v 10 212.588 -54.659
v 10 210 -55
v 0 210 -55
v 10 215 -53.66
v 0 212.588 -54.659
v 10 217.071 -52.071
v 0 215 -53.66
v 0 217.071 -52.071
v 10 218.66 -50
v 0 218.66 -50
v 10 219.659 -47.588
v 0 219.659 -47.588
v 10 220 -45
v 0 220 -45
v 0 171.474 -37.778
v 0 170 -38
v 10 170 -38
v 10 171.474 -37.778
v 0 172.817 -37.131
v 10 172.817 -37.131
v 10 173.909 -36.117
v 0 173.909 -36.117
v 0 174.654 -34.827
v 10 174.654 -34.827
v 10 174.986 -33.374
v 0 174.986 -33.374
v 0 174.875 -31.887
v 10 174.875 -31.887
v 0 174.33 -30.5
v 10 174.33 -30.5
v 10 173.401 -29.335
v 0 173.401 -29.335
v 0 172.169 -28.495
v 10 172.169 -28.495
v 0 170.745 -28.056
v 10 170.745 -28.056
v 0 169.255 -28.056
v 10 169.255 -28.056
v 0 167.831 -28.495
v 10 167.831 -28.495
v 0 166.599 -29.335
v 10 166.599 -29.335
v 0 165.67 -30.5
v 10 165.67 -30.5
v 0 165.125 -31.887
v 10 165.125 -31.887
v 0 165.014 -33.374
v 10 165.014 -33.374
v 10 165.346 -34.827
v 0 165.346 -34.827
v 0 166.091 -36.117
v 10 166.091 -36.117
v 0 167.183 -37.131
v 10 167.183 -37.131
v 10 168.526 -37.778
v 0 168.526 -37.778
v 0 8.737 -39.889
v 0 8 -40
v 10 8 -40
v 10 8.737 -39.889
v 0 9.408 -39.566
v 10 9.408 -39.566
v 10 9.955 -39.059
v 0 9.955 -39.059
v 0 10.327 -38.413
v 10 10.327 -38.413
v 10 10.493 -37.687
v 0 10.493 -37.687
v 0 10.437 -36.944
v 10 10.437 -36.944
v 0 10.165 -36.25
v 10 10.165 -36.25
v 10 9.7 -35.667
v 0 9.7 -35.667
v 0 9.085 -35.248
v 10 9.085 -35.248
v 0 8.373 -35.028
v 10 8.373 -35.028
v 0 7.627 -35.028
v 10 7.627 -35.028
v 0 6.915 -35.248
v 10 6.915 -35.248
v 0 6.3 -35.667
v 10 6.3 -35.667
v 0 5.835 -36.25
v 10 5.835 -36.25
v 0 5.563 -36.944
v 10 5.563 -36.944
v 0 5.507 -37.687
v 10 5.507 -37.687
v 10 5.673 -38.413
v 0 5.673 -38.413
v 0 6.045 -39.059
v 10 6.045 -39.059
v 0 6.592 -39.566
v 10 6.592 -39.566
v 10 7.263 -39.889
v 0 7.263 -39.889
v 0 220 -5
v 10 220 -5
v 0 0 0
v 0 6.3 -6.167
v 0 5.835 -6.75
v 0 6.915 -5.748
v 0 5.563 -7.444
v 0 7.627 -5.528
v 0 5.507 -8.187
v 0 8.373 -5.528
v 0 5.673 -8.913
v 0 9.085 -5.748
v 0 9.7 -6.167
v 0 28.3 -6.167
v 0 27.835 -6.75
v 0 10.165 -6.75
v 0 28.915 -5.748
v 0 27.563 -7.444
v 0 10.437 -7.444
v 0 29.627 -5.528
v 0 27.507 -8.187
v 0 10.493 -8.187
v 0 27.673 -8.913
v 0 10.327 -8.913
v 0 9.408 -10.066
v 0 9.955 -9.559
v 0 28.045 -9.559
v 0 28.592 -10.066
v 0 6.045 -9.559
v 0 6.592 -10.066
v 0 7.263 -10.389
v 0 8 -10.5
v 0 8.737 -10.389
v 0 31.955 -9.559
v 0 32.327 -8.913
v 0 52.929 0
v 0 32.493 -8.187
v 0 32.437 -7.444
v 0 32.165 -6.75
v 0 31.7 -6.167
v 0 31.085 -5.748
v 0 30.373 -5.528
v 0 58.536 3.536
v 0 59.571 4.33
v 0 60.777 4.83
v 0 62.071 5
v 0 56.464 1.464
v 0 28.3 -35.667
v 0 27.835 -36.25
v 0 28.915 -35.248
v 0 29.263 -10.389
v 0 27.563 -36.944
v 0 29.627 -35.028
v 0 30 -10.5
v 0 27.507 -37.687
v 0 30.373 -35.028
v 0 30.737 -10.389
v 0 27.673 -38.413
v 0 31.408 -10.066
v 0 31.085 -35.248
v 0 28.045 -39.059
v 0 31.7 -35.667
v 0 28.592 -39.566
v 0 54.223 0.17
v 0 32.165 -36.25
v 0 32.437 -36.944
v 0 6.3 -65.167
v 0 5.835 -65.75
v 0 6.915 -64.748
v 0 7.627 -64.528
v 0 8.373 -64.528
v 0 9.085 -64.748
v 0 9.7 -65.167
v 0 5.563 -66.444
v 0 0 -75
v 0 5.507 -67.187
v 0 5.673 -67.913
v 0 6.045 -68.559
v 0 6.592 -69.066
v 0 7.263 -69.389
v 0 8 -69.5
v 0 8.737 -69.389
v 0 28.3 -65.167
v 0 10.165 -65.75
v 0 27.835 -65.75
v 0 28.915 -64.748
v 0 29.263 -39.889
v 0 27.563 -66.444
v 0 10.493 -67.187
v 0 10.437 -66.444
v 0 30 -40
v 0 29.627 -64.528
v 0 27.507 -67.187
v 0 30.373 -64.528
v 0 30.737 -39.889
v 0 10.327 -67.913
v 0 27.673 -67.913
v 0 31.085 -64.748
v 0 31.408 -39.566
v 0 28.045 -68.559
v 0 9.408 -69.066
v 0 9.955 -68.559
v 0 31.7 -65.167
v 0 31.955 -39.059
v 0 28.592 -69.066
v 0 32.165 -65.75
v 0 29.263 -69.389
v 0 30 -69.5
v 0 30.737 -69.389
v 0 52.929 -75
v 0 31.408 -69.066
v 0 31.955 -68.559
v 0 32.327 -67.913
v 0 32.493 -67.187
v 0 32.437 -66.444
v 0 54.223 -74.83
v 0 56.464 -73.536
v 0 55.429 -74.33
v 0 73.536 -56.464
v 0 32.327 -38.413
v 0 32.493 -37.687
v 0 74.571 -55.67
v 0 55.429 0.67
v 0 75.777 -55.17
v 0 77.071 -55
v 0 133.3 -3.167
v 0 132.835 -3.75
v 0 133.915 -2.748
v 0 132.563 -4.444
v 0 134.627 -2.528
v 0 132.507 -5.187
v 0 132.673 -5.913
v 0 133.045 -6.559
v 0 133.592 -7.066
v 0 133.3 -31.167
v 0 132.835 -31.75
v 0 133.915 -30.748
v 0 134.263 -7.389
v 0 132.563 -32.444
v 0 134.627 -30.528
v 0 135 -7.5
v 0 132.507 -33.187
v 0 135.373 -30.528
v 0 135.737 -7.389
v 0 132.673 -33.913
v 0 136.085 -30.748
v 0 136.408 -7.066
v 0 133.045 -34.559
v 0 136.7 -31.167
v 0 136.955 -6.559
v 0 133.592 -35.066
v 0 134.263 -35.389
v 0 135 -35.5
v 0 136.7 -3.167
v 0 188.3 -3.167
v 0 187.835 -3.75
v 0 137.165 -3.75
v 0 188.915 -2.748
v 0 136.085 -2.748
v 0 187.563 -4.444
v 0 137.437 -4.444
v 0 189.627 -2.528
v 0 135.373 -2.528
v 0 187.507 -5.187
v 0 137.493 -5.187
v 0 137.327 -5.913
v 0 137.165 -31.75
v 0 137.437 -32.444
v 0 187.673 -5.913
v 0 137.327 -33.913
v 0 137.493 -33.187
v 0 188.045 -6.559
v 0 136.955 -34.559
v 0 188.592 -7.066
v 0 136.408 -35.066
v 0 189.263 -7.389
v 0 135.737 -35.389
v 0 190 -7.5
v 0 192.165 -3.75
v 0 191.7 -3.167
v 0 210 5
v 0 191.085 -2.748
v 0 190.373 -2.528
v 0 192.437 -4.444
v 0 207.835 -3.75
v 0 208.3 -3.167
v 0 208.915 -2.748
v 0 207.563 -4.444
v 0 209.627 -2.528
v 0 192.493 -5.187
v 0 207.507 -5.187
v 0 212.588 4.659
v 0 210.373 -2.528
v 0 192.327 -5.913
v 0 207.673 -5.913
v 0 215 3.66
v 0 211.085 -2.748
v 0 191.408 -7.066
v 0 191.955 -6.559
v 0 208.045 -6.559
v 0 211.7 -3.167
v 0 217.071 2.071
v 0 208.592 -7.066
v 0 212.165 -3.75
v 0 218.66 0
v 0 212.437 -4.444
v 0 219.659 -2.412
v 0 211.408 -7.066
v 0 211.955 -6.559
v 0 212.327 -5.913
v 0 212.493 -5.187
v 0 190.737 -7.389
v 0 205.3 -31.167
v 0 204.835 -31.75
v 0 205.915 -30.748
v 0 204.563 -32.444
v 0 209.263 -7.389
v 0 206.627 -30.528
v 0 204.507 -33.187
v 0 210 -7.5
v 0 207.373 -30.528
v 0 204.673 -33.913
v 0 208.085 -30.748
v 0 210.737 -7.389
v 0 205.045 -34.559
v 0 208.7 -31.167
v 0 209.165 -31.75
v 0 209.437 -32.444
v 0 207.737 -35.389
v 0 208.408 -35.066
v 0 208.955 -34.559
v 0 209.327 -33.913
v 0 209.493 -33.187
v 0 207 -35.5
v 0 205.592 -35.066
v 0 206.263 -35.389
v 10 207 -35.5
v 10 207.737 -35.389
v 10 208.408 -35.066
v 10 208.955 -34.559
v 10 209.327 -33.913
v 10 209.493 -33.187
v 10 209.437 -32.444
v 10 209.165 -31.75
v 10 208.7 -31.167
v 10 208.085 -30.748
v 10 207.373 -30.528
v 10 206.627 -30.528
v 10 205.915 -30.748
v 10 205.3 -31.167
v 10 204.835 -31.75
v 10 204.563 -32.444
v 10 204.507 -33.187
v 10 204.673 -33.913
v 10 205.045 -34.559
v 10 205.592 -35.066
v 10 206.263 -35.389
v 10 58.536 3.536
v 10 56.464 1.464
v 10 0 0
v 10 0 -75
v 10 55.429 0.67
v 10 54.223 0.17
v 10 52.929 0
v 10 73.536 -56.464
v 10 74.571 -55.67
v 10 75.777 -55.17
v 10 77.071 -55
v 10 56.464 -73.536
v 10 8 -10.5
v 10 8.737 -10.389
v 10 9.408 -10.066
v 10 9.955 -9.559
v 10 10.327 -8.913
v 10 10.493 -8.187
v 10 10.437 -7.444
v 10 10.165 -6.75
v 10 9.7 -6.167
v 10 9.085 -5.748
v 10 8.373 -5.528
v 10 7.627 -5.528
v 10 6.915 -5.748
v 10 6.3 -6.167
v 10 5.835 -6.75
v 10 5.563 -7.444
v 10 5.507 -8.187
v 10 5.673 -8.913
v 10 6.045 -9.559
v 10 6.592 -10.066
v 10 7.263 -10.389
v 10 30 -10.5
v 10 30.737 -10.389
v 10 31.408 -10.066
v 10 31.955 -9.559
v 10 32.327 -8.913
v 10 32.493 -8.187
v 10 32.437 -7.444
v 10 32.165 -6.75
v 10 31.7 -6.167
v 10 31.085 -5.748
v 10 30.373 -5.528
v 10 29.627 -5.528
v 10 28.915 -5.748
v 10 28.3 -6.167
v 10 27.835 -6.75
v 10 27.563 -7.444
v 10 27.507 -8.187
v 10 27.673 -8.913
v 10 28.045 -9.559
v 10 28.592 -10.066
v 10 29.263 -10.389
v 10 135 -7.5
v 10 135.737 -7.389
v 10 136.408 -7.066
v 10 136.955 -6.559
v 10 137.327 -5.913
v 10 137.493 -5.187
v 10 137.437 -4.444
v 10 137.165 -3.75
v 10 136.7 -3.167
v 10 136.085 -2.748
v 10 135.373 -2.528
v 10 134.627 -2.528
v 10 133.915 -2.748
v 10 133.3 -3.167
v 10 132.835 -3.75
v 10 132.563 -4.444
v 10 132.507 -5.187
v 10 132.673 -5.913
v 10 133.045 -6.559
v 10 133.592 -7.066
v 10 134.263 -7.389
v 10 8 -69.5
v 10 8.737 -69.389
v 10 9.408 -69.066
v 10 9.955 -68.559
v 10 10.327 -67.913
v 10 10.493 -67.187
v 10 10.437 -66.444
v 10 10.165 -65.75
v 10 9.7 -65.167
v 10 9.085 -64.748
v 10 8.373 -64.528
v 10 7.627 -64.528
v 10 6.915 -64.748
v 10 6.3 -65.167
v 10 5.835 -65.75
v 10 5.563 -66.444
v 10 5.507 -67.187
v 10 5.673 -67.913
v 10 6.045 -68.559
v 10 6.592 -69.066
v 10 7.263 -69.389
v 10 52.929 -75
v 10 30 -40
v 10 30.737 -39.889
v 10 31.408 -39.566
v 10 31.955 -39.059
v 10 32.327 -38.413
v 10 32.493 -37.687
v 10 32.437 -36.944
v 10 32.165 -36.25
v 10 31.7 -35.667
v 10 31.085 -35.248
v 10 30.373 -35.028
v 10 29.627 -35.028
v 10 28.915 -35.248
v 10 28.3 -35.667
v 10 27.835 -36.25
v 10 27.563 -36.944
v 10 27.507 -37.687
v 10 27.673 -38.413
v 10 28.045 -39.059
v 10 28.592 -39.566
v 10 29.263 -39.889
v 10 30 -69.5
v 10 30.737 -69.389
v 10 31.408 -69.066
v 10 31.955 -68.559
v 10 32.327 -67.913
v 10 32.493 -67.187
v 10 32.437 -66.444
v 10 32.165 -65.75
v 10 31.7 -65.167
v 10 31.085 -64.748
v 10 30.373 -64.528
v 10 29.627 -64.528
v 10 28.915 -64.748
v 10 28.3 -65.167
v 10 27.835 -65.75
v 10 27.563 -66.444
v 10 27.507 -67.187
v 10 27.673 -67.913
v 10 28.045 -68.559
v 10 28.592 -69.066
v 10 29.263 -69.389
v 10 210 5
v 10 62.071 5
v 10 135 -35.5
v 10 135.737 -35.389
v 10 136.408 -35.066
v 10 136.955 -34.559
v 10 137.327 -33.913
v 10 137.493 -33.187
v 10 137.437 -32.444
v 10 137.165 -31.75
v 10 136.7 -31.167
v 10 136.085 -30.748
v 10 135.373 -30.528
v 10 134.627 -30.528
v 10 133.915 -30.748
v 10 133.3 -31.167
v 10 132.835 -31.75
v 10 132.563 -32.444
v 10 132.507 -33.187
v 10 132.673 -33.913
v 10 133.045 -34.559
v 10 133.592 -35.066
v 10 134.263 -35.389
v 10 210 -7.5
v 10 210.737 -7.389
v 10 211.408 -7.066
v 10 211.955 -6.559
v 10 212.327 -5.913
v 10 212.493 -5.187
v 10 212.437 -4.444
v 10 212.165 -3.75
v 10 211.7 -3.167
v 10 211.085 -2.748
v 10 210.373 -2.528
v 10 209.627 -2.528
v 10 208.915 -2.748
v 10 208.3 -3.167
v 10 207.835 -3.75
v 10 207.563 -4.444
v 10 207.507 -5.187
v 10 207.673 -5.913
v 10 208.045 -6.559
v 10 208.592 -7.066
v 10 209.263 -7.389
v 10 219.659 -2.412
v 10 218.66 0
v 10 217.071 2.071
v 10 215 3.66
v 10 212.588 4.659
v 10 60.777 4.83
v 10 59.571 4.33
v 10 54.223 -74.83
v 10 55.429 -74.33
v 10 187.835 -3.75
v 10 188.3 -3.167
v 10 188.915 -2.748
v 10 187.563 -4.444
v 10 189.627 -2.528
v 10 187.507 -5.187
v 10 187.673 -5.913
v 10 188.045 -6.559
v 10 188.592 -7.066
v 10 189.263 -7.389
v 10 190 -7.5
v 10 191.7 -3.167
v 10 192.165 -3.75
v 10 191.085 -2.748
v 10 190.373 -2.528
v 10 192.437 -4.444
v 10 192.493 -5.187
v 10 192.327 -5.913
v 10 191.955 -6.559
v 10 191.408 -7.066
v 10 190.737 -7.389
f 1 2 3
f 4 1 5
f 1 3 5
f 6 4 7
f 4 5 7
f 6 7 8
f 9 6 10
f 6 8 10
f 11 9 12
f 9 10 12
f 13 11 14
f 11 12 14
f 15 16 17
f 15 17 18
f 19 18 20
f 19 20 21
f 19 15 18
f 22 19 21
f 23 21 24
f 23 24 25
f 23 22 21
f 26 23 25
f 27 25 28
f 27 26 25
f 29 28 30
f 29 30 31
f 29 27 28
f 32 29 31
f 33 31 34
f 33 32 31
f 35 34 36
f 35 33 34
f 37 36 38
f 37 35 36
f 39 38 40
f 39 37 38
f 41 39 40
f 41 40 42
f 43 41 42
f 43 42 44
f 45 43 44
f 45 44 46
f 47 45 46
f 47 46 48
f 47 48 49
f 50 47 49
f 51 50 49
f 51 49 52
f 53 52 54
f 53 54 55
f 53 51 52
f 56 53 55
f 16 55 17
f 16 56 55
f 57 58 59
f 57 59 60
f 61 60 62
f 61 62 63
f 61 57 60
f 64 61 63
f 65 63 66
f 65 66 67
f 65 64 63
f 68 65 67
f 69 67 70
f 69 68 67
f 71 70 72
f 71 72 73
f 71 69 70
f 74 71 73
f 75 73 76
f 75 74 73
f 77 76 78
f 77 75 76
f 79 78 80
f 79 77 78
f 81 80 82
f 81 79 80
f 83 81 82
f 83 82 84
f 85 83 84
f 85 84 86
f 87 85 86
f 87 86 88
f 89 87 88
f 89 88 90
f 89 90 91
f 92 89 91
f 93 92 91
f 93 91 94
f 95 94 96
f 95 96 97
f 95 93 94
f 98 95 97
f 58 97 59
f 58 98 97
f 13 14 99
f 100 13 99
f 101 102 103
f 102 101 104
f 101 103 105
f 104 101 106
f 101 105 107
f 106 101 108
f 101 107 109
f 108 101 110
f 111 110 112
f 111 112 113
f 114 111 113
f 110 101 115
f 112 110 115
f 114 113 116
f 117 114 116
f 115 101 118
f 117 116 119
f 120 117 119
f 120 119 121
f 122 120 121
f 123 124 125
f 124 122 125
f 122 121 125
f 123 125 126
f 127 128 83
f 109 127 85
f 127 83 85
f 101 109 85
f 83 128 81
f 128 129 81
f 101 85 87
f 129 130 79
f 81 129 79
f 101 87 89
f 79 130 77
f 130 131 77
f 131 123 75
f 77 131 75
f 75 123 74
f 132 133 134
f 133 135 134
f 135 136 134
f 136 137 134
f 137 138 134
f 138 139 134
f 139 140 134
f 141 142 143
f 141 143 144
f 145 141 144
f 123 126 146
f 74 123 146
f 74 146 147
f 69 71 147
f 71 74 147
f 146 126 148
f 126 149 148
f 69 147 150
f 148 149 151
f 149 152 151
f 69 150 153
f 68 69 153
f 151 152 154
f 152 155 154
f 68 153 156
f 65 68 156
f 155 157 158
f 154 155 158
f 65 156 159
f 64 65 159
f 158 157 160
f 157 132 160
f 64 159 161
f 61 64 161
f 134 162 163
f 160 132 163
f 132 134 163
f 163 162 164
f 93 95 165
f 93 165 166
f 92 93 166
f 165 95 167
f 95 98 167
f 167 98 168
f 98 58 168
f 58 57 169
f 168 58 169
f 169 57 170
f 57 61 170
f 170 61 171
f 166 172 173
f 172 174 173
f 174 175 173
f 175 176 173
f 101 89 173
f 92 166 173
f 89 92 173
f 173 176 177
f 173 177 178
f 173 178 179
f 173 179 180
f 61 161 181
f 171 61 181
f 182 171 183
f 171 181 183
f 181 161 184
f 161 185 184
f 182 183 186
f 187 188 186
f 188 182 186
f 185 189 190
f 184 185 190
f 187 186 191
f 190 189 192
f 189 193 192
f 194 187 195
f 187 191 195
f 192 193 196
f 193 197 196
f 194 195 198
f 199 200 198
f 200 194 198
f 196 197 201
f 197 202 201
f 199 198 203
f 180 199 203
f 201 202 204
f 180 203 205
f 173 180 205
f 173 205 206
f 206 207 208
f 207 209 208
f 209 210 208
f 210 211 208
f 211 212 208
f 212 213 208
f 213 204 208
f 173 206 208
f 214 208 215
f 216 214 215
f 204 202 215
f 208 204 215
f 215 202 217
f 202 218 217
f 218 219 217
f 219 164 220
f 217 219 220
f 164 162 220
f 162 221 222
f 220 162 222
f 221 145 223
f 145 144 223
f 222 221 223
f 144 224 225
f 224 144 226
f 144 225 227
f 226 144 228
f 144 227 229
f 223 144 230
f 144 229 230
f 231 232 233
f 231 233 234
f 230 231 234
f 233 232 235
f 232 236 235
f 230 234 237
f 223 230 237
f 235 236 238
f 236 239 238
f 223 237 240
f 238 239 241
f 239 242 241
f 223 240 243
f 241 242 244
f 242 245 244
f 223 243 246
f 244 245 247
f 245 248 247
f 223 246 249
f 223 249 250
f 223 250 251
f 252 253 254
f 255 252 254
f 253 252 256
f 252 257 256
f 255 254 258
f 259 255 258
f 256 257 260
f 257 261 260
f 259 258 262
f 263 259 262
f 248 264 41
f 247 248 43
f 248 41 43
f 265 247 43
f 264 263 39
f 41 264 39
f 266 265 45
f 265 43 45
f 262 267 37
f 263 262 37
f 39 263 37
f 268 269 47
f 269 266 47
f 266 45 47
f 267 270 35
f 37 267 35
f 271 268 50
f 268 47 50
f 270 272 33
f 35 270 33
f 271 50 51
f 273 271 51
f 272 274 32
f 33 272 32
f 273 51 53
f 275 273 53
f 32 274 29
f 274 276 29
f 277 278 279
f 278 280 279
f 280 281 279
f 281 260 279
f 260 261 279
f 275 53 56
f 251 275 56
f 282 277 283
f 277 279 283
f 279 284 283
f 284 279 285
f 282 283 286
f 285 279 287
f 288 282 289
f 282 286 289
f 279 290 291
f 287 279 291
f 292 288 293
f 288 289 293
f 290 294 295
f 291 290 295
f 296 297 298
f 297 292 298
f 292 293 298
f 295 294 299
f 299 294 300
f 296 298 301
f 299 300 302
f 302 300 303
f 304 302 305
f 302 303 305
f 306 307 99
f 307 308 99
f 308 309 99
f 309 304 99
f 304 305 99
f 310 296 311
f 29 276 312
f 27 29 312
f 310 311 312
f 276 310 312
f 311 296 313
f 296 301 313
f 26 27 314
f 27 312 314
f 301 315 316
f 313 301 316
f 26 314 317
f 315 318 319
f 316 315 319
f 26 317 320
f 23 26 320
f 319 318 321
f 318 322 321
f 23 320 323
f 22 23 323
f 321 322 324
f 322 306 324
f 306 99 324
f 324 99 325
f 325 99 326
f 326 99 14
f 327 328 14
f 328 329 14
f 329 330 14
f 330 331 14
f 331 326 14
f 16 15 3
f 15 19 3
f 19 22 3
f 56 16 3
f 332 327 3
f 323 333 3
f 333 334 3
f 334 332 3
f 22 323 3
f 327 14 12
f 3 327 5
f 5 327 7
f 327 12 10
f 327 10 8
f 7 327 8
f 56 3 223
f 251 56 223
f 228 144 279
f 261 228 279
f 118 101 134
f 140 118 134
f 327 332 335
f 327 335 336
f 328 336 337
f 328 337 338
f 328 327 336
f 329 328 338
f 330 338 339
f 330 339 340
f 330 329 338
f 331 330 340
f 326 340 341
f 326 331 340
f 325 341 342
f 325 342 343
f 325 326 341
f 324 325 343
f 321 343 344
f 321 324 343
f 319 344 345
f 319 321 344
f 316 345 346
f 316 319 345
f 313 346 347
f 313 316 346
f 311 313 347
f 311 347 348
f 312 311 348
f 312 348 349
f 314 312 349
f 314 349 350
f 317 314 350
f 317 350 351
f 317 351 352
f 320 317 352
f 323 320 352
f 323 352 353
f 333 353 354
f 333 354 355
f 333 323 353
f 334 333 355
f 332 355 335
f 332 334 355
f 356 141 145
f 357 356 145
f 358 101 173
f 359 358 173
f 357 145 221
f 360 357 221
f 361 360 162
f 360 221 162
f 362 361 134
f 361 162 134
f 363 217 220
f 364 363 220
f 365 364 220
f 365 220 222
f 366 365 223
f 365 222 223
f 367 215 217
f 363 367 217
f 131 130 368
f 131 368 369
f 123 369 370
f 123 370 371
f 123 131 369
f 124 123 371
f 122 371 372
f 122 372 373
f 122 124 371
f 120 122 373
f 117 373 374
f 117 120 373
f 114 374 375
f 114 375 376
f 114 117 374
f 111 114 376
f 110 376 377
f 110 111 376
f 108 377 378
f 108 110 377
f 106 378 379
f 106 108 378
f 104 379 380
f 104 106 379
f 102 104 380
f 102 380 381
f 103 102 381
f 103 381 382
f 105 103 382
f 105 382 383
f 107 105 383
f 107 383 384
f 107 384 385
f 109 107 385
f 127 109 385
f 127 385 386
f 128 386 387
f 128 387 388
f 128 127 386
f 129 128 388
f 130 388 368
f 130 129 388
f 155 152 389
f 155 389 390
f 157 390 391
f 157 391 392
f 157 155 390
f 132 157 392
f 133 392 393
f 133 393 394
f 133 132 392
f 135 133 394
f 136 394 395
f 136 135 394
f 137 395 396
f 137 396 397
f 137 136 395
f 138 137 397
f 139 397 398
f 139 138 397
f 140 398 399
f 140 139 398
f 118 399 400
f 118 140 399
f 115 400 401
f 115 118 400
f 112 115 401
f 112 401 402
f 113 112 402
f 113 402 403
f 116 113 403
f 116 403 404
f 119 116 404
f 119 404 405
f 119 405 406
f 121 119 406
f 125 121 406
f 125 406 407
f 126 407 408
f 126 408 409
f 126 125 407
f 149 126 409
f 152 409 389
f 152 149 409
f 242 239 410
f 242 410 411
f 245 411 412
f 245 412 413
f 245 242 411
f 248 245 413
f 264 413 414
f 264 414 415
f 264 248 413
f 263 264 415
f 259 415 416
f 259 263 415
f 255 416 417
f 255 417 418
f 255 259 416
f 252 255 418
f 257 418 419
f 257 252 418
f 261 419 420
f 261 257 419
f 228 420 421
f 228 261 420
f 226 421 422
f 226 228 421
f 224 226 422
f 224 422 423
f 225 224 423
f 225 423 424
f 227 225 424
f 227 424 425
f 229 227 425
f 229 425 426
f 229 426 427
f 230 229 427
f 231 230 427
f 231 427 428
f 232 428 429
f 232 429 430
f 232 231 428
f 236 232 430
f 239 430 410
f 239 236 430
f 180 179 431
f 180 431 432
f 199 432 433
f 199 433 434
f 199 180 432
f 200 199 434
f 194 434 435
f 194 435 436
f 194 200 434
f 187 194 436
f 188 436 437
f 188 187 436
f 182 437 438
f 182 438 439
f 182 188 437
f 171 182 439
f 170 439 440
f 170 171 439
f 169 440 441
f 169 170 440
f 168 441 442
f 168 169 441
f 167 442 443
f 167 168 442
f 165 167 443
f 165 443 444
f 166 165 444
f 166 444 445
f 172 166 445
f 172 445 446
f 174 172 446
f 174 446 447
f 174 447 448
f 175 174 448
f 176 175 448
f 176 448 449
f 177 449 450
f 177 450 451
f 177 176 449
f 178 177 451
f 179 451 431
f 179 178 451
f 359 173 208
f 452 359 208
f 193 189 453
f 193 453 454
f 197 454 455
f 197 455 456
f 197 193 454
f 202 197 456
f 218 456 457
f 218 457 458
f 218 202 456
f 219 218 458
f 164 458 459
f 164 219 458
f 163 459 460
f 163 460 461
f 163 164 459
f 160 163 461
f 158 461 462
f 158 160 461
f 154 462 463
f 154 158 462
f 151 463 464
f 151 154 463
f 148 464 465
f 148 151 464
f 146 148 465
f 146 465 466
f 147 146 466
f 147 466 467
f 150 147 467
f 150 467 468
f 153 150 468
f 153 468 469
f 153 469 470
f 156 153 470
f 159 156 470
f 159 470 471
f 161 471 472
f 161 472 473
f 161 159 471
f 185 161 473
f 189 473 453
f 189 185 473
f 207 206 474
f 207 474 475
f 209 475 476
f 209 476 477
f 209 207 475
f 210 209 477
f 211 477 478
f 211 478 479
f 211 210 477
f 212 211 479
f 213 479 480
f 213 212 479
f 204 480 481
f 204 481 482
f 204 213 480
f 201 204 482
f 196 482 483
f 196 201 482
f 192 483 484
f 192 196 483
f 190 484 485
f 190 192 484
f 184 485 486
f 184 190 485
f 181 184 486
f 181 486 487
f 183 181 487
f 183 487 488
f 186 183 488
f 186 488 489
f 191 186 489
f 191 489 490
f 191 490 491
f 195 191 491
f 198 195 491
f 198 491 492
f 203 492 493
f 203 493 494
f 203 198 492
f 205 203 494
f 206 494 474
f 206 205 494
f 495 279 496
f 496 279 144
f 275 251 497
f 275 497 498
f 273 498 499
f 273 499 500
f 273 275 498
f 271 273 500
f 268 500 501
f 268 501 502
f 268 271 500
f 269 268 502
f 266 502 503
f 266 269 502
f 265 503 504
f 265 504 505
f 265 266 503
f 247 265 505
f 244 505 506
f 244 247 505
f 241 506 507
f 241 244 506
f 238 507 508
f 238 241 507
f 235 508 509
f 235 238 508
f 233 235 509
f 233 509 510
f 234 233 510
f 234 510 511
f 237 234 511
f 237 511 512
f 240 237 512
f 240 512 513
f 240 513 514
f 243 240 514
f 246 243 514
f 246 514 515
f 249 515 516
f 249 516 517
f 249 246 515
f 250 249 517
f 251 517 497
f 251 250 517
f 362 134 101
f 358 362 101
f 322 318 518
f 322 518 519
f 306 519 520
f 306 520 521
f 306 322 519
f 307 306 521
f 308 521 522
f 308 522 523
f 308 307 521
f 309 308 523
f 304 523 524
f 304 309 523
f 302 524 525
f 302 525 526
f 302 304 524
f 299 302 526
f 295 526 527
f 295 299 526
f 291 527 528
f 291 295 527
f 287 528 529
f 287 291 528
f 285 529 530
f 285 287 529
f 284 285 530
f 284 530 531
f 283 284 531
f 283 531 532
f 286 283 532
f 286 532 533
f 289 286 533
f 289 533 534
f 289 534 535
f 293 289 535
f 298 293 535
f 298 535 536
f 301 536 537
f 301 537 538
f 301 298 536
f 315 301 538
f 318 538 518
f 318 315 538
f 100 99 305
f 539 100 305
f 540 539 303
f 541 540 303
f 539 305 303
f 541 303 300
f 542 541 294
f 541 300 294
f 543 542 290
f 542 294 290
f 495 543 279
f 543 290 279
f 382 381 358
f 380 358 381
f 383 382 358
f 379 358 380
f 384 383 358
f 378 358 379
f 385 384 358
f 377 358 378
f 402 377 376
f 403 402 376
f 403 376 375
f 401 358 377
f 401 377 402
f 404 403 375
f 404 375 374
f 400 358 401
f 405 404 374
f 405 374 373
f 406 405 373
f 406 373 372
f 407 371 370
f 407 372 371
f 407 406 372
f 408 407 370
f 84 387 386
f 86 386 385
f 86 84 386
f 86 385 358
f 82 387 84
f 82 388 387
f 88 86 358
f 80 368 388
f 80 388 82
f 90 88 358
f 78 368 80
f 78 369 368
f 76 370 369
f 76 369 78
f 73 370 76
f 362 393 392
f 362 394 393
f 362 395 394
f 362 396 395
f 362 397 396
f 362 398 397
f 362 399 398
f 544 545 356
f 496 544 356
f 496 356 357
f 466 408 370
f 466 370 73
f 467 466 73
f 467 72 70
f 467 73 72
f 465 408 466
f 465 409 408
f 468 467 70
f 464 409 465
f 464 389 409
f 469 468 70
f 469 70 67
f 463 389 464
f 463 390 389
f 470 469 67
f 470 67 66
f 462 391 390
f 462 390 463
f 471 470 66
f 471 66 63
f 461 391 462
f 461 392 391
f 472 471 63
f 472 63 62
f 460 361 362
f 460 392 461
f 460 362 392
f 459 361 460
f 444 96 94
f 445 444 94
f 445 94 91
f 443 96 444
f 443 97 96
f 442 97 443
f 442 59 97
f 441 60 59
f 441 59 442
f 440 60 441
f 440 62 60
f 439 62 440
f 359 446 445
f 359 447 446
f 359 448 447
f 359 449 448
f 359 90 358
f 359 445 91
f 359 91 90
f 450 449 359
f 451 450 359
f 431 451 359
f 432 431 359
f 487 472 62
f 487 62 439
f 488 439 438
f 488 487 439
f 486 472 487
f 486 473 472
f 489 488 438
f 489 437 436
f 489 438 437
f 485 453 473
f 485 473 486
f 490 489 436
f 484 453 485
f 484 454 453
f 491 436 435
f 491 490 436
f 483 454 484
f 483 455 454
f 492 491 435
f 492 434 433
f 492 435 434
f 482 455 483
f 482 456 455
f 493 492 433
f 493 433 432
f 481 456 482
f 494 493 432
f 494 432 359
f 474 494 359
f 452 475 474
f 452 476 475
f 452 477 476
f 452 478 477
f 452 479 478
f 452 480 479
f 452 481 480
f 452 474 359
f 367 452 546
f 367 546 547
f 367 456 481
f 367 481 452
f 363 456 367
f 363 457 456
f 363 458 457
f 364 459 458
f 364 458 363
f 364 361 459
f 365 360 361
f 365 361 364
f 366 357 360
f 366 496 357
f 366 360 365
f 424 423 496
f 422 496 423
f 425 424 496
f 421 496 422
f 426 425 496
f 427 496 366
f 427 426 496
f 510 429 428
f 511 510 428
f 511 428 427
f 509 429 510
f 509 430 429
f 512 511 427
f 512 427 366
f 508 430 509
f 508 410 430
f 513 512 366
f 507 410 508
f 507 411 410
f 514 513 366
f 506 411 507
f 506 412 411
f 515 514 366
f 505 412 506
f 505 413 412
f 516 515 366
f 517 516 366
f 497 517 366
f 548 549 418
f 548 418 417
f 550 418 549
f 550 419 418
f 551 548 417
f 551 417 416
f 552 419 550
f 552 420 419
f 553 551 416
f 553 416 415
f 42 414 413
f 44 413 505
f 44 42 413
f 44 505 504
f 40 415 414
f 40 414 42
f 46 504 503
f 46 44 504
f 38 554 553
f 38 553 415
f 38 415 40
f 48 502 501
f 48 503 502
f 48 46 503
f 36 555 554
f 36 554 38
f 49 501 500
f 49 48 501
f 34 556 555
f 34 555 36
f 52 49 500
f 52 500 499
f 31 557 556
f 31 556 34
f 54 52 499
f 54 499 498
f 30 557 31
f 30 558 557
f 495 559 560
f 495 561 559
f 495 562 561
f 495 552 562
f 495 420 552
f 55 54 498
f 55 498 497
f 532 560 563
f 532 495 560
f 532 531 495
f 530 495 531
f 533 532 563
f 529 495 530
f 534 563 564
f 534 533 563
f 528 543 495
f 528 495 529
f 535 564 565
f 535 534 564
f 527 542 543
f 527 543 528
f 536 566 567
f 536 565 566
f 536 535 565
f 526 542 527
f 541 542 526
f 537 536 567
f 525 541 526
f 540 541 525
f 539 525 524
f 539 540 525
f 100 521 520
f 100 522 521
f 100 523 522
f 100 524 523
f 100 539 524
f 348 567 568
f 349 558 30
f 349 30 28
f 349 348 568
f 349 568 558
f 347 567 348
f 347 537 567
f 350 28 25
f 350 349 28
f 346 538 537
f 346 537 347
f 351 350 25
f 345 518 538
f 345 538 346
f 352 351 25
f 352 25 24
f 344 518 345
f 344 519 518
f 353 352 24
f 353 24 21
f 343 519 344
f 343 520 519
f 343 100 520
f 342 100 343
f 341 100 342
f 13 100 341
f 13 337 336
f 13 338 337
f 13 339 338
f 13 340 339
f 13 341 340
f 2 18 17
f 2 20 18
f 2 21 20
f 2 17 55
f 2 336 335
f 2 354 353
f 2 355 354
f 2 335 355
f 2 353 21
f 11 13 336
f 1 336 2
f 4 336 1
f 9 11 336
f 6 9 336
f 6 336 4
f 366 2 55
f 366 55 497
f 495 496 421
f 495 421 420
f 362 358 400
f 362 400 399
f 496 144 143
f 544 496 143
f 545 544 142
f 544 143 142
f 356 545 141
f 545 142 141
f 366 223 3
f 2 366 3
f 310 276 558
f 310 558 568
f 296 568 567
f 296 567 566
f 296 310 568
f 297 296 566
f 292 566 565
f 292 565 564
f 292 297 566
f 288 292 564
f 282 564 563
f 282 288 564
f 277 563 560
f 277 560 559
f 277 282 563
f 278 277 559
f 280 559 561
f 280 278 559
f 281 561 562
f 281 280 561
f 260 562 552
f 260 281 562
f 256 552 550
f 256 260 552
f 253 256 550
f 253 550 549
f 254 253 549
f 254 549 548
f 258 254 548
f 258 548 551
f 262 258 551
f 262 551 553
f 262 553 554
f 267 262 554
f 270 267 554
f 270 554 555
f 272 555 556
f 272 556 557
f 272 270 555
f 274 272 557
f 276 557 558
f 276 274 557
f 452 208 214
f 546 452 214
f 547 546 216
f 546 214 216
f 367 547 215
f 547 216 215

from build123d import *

# Parameters (mm, degrees)
SKETCH1_R           = 2.5
SKETCH1_R_2         = 5
BOSS_EXTRUDE1_DEPTH = 10


with BuildPart() as part:
    # Sketch1 → Boss-Extrude1 (new body)
    with BuildSketch(Plane(origin=(0, 0, 0), x_dir=(0, 0, -1), z_dir=(1, 0, 0))):
        with BuildLine():
            Line((0, 0), (75, 0))
            Line((75, 0), (75, 52.928932188))
            ThreePointArc((75, 52.928932188), (74.619397663, 54.84234935), (73.535533906, 56.464466094))
            Line((73.535533906, 56.464466094), (56.464466094, 73.535533906))
            ThreePointArc((56.464466094, 73.535533906), (55.380602337, 75.15765065), (55, 77.071067812))
            Line((55, 77.071067812), (55, 210))
            ThreePointArc((55, 210), (52.071067812, 217.071067812), (45, 220))
            Line((45, 220), (5, 220))
            ThreePointArc((5, 220), (-2.071067812, 217.071067812), (-5, 210))
            Line((-5, 210), (-5, 62.071067812))
            ThreePointArc((-5, 62.071067812), (-4.619397663, 60.15765065), (-3.535533906, 58.535533906))
            Line((-3.535533906, 58.535533906), (-1.464466094, 56.464466094))
            ThreePointArc((-1.464466094, 56.464466094), (-0.380602337, 54.84234935), (0, 52.928932188))
            Line((0, 52.928932188), (0, 0))
        make_face()
        with Locations((5, 210)):
            Circle(SKETCH1_R, mode=Mode.SUBTRACT)
        with Locations((5, 190)):
            Circle(SKETCH1_R, mode=Mode.SUBTRACT)
        with Locations((33, 207)):
            Circle(SKETCH1_R, mode=Mode.SUBTRACT)
        with Locations((5, 135)):
            Circle(SKETCH1_R, mode=Mode.SUBTRACT)
        with Locations((33, 135)):
            Circle(SKETCH1_R, mode=Mode.SUBTRACT)
        with Locations((8, 30)):
            Circle(SKETCH1_R, mode=Mode.SUBTRACT)
        with Locations((8, 8)):
            Circle(SKETCH1_R, mode=Mode.SUBTRACT)
        with Locations((37.5, 8)):
            Circle(SKETCH1_R, mode=Mode.SUBTRACT)
        with Locations((37.5, 30)):
            Circle(SKETCH1_R, mode=Mode.SUBTRACT)
        with Locations((67, 30)):
            Circle(SKETCH1_R, mode=Mode.SUBTRACT)
        with Locations((67, 8)):
            Circle(SKETCH1_R, mode=Mode.SUBTRACT)
        with Locations((33, 170)):
            Circle(SKETCH1_R_2, mode=Mode.SUBTRACT)
    extrude(amount=BOSS_EXTRUDE1_DEPTH)


solid = part.part
